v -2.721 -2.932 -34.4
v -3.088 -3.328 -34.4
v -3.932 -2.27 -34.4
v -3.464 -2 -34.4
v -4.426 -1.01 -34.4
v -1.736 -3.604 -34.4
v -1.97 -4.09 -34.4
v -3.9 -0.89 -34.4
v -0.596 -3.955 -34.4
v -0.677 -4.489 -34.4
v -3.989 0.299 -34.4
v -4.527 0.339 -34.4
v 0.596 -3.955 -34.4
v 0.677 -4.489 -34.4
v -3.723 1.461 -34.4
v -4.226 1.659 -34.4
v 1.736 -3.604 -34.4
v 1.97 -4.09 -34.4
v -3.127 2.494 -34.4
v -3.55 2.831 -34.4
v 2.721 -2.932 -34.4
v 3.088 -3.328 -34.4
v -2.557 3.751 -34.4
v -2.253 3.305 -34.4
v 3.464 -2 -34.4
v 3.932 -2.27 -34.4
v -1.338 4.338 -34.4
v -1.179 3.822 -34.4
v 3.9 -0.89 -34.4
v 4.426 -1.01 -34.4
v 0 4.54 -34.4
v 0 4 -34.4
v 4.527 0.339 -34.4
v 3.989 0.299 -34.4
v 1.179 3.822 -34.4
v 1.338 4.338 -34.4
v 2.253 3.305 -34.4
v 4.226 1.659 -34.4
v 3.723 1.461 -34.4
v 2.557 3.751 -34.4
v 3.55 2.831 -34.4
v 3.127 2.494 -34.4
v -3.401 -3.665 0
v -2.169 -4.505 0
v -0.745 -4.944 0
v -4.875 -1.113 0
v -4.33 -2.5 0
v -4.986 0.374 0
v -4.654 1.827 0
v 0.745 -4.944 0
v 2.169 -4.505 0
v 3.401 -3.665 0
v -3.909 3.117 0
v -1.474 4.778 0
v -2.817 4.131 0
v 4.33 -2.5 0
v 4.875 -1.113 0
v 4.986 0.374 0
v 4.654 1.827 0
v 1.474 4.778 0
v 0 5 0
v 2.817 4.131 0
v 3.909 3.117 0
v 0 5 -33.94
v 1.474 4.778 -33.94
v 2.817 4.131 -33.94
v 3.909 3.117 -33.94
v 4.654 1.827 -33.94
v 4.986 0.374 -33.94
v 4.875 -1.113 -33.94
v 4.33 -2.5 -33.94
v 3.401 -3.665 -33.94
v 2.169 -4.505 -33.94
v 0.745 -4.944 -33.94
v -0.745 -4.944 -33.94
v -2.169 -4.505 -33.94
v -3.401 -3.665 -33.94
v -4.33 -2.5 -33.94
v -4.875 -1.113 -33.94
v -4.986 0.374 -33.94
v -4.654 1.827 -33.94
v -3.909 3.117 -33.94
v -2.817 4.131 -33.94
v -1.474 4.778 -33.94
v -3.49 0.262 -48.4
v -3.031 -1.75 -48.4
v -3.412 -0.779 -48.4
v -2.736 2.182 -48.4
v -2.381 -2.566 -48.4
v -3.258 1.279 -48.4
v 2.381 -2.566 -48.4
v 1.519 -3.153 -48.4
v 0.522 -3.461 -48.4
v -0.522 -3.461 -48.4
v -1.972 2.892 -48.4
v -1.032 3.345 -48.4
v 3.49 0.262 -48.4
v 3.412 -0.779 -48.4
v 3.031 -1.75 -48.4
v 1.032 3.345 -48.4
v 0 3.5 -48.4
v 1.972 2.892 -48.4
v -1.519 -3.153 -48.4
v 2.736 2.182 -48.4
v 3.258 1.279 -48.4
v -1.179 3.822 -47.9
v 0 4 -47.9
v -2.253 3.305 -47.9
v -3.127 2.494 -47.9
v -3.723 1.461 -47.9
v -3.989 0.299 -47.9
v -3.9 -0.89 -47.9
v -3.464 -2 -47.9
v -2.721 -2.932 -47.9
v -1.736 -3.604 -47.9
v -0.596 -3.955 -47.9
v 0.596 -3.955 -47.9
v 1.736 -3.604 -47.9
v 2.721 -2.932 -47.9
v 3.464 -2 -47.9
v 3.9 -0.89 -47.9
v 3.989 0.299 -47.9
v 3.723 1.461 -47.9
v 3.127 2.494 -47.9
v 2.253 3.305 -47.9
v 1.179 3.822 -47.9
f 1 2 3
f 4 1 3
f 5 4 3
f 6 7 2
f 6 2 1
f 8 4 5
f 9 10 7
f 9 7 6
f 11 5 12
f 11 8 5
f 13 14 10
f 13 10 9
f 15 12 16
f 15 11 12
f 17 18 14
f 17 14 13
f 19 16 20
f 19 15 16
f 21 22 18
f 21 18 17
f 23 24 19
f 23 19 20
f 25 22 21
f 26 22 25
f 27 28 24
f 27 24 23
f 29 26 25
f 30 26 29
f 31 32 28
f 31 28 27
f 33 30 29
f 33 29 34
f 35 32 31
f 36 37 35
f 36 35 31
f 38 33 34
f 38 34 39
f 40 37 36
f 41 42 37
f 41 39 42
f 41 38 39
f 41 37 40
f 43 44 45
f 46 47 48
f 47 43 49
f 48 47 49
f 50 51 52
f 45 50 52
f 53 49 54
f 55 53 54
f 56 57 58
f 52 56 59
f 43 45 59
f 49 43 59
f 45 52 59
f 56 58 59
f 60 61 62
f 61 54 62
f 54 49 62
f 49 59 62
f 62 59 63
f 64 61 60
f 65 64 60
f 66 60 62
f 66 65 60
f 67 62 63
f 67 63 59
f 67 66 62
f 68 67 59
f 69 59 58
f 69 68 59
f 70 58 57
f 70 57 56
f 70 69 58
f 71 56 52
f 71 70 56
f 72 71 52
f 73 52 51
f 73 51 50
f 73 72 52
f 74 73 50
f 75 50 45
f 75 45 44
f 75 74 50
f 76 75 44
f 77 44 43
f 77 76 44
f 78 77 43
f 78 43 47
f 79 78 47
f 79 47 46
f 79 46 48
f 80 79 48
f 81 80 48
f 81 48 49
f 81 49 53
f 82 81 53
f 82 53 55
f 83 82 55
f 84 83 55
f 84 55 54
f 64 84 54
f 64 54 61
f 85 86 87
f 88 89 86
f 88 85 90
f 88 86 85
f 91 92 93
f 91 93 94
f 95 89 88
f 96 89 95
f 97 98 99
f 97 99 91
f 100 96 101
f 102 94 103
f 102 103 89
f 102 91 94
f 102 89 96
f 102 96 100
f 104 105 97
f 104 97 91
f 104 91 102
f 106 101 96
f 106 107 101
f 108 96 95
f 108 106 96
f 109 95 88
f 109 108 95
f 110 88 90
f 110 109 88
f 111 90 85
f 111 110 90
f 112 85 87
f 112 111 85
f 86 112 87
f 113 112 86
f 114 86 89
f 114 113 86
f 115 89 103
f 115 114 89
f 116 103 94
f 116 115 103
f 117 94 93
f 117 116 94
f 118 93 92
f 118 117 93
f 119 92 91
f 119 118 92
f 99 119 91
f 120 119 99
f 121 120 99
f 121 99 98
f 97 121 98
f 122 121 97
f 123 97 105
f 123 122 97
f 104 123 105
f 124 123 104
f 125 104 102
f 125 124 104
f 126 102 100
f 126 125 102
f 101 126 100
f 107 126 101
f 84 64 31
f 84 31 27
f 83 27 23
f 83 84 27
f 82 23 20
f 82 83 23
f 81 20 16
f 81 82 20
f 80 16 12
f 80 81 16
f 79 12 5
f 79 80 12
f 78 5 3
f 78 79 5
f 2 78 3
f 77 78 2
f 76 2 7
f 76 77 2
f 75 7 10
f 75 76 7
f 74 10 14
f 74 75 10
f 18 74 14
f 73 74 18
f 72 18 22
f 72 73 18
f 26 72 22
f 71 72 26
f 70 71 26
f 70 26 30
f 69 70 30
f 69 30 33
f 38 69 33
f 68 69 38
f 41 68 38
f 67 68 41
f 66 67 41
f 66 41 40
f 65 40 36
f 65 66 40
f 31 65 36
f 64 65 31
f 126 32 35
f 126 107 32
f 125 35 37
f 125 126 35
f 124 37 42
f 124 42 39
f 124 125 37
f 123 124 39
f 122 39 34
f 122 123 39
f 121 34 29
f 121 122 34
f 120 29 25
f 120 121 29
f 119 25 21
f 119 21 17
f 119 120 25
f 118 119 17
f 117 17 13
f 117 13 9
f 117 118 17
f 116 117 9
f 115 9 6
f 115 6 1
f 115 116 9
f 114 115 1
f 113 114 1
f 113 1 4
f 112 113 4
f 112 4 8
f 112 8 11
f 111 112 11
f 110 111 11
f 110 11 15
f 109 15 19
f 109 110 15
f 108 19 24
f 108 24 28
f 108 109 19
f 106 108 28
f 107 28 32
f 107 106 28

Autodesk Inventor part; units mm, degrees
sketch "Sketch_1" plane through (0, 0, 0) normal (1, 0, 0) x (0, 1, 0)
  line L0 (0, -48.4) -> (0, 0)
  line L1 (0, 0) -> (5, 0)
  line L2 (5, 0) -> (5, -33.94)
  line L3 (5, -33.94) -> (4.54, -34.4)
  line L4 (4.54, -34.4) -> (4, -34.4)
  line L5 (4, -34.4) -> (4, -47.9)
  line L6 (4, -47.9) -> (3.5, -48.4)
  line L7 (3.5, -48.4) -> (0, -48.4)
  line L8 (0, -48.4) -> (0, 0)
revolve "Revolution1" add sketch "Sketch_1" angle 360 about axis through (0, 0, -48.4) along (0, 0, -1)
thread "Thread1" size "M10x0.75" class "6g" standard "ISO Metric profile" length 9.54
ref_plane "ANBAU_XY" through (0, 0, 0) normal (0, 0, 1) x (1, 0, 0)
ref_plane "ANBAU_YZ" through (0, 0, 0) normal (1, 0, 0) x (0, 1, 0)
ref_plane "ANBAU_ZX" through (0, 0, 0) normal (0, 1, 0) x (0, 0, 1)
properties part number "ESBF-BS-40-ESBF-BS-40---(KSA)"
